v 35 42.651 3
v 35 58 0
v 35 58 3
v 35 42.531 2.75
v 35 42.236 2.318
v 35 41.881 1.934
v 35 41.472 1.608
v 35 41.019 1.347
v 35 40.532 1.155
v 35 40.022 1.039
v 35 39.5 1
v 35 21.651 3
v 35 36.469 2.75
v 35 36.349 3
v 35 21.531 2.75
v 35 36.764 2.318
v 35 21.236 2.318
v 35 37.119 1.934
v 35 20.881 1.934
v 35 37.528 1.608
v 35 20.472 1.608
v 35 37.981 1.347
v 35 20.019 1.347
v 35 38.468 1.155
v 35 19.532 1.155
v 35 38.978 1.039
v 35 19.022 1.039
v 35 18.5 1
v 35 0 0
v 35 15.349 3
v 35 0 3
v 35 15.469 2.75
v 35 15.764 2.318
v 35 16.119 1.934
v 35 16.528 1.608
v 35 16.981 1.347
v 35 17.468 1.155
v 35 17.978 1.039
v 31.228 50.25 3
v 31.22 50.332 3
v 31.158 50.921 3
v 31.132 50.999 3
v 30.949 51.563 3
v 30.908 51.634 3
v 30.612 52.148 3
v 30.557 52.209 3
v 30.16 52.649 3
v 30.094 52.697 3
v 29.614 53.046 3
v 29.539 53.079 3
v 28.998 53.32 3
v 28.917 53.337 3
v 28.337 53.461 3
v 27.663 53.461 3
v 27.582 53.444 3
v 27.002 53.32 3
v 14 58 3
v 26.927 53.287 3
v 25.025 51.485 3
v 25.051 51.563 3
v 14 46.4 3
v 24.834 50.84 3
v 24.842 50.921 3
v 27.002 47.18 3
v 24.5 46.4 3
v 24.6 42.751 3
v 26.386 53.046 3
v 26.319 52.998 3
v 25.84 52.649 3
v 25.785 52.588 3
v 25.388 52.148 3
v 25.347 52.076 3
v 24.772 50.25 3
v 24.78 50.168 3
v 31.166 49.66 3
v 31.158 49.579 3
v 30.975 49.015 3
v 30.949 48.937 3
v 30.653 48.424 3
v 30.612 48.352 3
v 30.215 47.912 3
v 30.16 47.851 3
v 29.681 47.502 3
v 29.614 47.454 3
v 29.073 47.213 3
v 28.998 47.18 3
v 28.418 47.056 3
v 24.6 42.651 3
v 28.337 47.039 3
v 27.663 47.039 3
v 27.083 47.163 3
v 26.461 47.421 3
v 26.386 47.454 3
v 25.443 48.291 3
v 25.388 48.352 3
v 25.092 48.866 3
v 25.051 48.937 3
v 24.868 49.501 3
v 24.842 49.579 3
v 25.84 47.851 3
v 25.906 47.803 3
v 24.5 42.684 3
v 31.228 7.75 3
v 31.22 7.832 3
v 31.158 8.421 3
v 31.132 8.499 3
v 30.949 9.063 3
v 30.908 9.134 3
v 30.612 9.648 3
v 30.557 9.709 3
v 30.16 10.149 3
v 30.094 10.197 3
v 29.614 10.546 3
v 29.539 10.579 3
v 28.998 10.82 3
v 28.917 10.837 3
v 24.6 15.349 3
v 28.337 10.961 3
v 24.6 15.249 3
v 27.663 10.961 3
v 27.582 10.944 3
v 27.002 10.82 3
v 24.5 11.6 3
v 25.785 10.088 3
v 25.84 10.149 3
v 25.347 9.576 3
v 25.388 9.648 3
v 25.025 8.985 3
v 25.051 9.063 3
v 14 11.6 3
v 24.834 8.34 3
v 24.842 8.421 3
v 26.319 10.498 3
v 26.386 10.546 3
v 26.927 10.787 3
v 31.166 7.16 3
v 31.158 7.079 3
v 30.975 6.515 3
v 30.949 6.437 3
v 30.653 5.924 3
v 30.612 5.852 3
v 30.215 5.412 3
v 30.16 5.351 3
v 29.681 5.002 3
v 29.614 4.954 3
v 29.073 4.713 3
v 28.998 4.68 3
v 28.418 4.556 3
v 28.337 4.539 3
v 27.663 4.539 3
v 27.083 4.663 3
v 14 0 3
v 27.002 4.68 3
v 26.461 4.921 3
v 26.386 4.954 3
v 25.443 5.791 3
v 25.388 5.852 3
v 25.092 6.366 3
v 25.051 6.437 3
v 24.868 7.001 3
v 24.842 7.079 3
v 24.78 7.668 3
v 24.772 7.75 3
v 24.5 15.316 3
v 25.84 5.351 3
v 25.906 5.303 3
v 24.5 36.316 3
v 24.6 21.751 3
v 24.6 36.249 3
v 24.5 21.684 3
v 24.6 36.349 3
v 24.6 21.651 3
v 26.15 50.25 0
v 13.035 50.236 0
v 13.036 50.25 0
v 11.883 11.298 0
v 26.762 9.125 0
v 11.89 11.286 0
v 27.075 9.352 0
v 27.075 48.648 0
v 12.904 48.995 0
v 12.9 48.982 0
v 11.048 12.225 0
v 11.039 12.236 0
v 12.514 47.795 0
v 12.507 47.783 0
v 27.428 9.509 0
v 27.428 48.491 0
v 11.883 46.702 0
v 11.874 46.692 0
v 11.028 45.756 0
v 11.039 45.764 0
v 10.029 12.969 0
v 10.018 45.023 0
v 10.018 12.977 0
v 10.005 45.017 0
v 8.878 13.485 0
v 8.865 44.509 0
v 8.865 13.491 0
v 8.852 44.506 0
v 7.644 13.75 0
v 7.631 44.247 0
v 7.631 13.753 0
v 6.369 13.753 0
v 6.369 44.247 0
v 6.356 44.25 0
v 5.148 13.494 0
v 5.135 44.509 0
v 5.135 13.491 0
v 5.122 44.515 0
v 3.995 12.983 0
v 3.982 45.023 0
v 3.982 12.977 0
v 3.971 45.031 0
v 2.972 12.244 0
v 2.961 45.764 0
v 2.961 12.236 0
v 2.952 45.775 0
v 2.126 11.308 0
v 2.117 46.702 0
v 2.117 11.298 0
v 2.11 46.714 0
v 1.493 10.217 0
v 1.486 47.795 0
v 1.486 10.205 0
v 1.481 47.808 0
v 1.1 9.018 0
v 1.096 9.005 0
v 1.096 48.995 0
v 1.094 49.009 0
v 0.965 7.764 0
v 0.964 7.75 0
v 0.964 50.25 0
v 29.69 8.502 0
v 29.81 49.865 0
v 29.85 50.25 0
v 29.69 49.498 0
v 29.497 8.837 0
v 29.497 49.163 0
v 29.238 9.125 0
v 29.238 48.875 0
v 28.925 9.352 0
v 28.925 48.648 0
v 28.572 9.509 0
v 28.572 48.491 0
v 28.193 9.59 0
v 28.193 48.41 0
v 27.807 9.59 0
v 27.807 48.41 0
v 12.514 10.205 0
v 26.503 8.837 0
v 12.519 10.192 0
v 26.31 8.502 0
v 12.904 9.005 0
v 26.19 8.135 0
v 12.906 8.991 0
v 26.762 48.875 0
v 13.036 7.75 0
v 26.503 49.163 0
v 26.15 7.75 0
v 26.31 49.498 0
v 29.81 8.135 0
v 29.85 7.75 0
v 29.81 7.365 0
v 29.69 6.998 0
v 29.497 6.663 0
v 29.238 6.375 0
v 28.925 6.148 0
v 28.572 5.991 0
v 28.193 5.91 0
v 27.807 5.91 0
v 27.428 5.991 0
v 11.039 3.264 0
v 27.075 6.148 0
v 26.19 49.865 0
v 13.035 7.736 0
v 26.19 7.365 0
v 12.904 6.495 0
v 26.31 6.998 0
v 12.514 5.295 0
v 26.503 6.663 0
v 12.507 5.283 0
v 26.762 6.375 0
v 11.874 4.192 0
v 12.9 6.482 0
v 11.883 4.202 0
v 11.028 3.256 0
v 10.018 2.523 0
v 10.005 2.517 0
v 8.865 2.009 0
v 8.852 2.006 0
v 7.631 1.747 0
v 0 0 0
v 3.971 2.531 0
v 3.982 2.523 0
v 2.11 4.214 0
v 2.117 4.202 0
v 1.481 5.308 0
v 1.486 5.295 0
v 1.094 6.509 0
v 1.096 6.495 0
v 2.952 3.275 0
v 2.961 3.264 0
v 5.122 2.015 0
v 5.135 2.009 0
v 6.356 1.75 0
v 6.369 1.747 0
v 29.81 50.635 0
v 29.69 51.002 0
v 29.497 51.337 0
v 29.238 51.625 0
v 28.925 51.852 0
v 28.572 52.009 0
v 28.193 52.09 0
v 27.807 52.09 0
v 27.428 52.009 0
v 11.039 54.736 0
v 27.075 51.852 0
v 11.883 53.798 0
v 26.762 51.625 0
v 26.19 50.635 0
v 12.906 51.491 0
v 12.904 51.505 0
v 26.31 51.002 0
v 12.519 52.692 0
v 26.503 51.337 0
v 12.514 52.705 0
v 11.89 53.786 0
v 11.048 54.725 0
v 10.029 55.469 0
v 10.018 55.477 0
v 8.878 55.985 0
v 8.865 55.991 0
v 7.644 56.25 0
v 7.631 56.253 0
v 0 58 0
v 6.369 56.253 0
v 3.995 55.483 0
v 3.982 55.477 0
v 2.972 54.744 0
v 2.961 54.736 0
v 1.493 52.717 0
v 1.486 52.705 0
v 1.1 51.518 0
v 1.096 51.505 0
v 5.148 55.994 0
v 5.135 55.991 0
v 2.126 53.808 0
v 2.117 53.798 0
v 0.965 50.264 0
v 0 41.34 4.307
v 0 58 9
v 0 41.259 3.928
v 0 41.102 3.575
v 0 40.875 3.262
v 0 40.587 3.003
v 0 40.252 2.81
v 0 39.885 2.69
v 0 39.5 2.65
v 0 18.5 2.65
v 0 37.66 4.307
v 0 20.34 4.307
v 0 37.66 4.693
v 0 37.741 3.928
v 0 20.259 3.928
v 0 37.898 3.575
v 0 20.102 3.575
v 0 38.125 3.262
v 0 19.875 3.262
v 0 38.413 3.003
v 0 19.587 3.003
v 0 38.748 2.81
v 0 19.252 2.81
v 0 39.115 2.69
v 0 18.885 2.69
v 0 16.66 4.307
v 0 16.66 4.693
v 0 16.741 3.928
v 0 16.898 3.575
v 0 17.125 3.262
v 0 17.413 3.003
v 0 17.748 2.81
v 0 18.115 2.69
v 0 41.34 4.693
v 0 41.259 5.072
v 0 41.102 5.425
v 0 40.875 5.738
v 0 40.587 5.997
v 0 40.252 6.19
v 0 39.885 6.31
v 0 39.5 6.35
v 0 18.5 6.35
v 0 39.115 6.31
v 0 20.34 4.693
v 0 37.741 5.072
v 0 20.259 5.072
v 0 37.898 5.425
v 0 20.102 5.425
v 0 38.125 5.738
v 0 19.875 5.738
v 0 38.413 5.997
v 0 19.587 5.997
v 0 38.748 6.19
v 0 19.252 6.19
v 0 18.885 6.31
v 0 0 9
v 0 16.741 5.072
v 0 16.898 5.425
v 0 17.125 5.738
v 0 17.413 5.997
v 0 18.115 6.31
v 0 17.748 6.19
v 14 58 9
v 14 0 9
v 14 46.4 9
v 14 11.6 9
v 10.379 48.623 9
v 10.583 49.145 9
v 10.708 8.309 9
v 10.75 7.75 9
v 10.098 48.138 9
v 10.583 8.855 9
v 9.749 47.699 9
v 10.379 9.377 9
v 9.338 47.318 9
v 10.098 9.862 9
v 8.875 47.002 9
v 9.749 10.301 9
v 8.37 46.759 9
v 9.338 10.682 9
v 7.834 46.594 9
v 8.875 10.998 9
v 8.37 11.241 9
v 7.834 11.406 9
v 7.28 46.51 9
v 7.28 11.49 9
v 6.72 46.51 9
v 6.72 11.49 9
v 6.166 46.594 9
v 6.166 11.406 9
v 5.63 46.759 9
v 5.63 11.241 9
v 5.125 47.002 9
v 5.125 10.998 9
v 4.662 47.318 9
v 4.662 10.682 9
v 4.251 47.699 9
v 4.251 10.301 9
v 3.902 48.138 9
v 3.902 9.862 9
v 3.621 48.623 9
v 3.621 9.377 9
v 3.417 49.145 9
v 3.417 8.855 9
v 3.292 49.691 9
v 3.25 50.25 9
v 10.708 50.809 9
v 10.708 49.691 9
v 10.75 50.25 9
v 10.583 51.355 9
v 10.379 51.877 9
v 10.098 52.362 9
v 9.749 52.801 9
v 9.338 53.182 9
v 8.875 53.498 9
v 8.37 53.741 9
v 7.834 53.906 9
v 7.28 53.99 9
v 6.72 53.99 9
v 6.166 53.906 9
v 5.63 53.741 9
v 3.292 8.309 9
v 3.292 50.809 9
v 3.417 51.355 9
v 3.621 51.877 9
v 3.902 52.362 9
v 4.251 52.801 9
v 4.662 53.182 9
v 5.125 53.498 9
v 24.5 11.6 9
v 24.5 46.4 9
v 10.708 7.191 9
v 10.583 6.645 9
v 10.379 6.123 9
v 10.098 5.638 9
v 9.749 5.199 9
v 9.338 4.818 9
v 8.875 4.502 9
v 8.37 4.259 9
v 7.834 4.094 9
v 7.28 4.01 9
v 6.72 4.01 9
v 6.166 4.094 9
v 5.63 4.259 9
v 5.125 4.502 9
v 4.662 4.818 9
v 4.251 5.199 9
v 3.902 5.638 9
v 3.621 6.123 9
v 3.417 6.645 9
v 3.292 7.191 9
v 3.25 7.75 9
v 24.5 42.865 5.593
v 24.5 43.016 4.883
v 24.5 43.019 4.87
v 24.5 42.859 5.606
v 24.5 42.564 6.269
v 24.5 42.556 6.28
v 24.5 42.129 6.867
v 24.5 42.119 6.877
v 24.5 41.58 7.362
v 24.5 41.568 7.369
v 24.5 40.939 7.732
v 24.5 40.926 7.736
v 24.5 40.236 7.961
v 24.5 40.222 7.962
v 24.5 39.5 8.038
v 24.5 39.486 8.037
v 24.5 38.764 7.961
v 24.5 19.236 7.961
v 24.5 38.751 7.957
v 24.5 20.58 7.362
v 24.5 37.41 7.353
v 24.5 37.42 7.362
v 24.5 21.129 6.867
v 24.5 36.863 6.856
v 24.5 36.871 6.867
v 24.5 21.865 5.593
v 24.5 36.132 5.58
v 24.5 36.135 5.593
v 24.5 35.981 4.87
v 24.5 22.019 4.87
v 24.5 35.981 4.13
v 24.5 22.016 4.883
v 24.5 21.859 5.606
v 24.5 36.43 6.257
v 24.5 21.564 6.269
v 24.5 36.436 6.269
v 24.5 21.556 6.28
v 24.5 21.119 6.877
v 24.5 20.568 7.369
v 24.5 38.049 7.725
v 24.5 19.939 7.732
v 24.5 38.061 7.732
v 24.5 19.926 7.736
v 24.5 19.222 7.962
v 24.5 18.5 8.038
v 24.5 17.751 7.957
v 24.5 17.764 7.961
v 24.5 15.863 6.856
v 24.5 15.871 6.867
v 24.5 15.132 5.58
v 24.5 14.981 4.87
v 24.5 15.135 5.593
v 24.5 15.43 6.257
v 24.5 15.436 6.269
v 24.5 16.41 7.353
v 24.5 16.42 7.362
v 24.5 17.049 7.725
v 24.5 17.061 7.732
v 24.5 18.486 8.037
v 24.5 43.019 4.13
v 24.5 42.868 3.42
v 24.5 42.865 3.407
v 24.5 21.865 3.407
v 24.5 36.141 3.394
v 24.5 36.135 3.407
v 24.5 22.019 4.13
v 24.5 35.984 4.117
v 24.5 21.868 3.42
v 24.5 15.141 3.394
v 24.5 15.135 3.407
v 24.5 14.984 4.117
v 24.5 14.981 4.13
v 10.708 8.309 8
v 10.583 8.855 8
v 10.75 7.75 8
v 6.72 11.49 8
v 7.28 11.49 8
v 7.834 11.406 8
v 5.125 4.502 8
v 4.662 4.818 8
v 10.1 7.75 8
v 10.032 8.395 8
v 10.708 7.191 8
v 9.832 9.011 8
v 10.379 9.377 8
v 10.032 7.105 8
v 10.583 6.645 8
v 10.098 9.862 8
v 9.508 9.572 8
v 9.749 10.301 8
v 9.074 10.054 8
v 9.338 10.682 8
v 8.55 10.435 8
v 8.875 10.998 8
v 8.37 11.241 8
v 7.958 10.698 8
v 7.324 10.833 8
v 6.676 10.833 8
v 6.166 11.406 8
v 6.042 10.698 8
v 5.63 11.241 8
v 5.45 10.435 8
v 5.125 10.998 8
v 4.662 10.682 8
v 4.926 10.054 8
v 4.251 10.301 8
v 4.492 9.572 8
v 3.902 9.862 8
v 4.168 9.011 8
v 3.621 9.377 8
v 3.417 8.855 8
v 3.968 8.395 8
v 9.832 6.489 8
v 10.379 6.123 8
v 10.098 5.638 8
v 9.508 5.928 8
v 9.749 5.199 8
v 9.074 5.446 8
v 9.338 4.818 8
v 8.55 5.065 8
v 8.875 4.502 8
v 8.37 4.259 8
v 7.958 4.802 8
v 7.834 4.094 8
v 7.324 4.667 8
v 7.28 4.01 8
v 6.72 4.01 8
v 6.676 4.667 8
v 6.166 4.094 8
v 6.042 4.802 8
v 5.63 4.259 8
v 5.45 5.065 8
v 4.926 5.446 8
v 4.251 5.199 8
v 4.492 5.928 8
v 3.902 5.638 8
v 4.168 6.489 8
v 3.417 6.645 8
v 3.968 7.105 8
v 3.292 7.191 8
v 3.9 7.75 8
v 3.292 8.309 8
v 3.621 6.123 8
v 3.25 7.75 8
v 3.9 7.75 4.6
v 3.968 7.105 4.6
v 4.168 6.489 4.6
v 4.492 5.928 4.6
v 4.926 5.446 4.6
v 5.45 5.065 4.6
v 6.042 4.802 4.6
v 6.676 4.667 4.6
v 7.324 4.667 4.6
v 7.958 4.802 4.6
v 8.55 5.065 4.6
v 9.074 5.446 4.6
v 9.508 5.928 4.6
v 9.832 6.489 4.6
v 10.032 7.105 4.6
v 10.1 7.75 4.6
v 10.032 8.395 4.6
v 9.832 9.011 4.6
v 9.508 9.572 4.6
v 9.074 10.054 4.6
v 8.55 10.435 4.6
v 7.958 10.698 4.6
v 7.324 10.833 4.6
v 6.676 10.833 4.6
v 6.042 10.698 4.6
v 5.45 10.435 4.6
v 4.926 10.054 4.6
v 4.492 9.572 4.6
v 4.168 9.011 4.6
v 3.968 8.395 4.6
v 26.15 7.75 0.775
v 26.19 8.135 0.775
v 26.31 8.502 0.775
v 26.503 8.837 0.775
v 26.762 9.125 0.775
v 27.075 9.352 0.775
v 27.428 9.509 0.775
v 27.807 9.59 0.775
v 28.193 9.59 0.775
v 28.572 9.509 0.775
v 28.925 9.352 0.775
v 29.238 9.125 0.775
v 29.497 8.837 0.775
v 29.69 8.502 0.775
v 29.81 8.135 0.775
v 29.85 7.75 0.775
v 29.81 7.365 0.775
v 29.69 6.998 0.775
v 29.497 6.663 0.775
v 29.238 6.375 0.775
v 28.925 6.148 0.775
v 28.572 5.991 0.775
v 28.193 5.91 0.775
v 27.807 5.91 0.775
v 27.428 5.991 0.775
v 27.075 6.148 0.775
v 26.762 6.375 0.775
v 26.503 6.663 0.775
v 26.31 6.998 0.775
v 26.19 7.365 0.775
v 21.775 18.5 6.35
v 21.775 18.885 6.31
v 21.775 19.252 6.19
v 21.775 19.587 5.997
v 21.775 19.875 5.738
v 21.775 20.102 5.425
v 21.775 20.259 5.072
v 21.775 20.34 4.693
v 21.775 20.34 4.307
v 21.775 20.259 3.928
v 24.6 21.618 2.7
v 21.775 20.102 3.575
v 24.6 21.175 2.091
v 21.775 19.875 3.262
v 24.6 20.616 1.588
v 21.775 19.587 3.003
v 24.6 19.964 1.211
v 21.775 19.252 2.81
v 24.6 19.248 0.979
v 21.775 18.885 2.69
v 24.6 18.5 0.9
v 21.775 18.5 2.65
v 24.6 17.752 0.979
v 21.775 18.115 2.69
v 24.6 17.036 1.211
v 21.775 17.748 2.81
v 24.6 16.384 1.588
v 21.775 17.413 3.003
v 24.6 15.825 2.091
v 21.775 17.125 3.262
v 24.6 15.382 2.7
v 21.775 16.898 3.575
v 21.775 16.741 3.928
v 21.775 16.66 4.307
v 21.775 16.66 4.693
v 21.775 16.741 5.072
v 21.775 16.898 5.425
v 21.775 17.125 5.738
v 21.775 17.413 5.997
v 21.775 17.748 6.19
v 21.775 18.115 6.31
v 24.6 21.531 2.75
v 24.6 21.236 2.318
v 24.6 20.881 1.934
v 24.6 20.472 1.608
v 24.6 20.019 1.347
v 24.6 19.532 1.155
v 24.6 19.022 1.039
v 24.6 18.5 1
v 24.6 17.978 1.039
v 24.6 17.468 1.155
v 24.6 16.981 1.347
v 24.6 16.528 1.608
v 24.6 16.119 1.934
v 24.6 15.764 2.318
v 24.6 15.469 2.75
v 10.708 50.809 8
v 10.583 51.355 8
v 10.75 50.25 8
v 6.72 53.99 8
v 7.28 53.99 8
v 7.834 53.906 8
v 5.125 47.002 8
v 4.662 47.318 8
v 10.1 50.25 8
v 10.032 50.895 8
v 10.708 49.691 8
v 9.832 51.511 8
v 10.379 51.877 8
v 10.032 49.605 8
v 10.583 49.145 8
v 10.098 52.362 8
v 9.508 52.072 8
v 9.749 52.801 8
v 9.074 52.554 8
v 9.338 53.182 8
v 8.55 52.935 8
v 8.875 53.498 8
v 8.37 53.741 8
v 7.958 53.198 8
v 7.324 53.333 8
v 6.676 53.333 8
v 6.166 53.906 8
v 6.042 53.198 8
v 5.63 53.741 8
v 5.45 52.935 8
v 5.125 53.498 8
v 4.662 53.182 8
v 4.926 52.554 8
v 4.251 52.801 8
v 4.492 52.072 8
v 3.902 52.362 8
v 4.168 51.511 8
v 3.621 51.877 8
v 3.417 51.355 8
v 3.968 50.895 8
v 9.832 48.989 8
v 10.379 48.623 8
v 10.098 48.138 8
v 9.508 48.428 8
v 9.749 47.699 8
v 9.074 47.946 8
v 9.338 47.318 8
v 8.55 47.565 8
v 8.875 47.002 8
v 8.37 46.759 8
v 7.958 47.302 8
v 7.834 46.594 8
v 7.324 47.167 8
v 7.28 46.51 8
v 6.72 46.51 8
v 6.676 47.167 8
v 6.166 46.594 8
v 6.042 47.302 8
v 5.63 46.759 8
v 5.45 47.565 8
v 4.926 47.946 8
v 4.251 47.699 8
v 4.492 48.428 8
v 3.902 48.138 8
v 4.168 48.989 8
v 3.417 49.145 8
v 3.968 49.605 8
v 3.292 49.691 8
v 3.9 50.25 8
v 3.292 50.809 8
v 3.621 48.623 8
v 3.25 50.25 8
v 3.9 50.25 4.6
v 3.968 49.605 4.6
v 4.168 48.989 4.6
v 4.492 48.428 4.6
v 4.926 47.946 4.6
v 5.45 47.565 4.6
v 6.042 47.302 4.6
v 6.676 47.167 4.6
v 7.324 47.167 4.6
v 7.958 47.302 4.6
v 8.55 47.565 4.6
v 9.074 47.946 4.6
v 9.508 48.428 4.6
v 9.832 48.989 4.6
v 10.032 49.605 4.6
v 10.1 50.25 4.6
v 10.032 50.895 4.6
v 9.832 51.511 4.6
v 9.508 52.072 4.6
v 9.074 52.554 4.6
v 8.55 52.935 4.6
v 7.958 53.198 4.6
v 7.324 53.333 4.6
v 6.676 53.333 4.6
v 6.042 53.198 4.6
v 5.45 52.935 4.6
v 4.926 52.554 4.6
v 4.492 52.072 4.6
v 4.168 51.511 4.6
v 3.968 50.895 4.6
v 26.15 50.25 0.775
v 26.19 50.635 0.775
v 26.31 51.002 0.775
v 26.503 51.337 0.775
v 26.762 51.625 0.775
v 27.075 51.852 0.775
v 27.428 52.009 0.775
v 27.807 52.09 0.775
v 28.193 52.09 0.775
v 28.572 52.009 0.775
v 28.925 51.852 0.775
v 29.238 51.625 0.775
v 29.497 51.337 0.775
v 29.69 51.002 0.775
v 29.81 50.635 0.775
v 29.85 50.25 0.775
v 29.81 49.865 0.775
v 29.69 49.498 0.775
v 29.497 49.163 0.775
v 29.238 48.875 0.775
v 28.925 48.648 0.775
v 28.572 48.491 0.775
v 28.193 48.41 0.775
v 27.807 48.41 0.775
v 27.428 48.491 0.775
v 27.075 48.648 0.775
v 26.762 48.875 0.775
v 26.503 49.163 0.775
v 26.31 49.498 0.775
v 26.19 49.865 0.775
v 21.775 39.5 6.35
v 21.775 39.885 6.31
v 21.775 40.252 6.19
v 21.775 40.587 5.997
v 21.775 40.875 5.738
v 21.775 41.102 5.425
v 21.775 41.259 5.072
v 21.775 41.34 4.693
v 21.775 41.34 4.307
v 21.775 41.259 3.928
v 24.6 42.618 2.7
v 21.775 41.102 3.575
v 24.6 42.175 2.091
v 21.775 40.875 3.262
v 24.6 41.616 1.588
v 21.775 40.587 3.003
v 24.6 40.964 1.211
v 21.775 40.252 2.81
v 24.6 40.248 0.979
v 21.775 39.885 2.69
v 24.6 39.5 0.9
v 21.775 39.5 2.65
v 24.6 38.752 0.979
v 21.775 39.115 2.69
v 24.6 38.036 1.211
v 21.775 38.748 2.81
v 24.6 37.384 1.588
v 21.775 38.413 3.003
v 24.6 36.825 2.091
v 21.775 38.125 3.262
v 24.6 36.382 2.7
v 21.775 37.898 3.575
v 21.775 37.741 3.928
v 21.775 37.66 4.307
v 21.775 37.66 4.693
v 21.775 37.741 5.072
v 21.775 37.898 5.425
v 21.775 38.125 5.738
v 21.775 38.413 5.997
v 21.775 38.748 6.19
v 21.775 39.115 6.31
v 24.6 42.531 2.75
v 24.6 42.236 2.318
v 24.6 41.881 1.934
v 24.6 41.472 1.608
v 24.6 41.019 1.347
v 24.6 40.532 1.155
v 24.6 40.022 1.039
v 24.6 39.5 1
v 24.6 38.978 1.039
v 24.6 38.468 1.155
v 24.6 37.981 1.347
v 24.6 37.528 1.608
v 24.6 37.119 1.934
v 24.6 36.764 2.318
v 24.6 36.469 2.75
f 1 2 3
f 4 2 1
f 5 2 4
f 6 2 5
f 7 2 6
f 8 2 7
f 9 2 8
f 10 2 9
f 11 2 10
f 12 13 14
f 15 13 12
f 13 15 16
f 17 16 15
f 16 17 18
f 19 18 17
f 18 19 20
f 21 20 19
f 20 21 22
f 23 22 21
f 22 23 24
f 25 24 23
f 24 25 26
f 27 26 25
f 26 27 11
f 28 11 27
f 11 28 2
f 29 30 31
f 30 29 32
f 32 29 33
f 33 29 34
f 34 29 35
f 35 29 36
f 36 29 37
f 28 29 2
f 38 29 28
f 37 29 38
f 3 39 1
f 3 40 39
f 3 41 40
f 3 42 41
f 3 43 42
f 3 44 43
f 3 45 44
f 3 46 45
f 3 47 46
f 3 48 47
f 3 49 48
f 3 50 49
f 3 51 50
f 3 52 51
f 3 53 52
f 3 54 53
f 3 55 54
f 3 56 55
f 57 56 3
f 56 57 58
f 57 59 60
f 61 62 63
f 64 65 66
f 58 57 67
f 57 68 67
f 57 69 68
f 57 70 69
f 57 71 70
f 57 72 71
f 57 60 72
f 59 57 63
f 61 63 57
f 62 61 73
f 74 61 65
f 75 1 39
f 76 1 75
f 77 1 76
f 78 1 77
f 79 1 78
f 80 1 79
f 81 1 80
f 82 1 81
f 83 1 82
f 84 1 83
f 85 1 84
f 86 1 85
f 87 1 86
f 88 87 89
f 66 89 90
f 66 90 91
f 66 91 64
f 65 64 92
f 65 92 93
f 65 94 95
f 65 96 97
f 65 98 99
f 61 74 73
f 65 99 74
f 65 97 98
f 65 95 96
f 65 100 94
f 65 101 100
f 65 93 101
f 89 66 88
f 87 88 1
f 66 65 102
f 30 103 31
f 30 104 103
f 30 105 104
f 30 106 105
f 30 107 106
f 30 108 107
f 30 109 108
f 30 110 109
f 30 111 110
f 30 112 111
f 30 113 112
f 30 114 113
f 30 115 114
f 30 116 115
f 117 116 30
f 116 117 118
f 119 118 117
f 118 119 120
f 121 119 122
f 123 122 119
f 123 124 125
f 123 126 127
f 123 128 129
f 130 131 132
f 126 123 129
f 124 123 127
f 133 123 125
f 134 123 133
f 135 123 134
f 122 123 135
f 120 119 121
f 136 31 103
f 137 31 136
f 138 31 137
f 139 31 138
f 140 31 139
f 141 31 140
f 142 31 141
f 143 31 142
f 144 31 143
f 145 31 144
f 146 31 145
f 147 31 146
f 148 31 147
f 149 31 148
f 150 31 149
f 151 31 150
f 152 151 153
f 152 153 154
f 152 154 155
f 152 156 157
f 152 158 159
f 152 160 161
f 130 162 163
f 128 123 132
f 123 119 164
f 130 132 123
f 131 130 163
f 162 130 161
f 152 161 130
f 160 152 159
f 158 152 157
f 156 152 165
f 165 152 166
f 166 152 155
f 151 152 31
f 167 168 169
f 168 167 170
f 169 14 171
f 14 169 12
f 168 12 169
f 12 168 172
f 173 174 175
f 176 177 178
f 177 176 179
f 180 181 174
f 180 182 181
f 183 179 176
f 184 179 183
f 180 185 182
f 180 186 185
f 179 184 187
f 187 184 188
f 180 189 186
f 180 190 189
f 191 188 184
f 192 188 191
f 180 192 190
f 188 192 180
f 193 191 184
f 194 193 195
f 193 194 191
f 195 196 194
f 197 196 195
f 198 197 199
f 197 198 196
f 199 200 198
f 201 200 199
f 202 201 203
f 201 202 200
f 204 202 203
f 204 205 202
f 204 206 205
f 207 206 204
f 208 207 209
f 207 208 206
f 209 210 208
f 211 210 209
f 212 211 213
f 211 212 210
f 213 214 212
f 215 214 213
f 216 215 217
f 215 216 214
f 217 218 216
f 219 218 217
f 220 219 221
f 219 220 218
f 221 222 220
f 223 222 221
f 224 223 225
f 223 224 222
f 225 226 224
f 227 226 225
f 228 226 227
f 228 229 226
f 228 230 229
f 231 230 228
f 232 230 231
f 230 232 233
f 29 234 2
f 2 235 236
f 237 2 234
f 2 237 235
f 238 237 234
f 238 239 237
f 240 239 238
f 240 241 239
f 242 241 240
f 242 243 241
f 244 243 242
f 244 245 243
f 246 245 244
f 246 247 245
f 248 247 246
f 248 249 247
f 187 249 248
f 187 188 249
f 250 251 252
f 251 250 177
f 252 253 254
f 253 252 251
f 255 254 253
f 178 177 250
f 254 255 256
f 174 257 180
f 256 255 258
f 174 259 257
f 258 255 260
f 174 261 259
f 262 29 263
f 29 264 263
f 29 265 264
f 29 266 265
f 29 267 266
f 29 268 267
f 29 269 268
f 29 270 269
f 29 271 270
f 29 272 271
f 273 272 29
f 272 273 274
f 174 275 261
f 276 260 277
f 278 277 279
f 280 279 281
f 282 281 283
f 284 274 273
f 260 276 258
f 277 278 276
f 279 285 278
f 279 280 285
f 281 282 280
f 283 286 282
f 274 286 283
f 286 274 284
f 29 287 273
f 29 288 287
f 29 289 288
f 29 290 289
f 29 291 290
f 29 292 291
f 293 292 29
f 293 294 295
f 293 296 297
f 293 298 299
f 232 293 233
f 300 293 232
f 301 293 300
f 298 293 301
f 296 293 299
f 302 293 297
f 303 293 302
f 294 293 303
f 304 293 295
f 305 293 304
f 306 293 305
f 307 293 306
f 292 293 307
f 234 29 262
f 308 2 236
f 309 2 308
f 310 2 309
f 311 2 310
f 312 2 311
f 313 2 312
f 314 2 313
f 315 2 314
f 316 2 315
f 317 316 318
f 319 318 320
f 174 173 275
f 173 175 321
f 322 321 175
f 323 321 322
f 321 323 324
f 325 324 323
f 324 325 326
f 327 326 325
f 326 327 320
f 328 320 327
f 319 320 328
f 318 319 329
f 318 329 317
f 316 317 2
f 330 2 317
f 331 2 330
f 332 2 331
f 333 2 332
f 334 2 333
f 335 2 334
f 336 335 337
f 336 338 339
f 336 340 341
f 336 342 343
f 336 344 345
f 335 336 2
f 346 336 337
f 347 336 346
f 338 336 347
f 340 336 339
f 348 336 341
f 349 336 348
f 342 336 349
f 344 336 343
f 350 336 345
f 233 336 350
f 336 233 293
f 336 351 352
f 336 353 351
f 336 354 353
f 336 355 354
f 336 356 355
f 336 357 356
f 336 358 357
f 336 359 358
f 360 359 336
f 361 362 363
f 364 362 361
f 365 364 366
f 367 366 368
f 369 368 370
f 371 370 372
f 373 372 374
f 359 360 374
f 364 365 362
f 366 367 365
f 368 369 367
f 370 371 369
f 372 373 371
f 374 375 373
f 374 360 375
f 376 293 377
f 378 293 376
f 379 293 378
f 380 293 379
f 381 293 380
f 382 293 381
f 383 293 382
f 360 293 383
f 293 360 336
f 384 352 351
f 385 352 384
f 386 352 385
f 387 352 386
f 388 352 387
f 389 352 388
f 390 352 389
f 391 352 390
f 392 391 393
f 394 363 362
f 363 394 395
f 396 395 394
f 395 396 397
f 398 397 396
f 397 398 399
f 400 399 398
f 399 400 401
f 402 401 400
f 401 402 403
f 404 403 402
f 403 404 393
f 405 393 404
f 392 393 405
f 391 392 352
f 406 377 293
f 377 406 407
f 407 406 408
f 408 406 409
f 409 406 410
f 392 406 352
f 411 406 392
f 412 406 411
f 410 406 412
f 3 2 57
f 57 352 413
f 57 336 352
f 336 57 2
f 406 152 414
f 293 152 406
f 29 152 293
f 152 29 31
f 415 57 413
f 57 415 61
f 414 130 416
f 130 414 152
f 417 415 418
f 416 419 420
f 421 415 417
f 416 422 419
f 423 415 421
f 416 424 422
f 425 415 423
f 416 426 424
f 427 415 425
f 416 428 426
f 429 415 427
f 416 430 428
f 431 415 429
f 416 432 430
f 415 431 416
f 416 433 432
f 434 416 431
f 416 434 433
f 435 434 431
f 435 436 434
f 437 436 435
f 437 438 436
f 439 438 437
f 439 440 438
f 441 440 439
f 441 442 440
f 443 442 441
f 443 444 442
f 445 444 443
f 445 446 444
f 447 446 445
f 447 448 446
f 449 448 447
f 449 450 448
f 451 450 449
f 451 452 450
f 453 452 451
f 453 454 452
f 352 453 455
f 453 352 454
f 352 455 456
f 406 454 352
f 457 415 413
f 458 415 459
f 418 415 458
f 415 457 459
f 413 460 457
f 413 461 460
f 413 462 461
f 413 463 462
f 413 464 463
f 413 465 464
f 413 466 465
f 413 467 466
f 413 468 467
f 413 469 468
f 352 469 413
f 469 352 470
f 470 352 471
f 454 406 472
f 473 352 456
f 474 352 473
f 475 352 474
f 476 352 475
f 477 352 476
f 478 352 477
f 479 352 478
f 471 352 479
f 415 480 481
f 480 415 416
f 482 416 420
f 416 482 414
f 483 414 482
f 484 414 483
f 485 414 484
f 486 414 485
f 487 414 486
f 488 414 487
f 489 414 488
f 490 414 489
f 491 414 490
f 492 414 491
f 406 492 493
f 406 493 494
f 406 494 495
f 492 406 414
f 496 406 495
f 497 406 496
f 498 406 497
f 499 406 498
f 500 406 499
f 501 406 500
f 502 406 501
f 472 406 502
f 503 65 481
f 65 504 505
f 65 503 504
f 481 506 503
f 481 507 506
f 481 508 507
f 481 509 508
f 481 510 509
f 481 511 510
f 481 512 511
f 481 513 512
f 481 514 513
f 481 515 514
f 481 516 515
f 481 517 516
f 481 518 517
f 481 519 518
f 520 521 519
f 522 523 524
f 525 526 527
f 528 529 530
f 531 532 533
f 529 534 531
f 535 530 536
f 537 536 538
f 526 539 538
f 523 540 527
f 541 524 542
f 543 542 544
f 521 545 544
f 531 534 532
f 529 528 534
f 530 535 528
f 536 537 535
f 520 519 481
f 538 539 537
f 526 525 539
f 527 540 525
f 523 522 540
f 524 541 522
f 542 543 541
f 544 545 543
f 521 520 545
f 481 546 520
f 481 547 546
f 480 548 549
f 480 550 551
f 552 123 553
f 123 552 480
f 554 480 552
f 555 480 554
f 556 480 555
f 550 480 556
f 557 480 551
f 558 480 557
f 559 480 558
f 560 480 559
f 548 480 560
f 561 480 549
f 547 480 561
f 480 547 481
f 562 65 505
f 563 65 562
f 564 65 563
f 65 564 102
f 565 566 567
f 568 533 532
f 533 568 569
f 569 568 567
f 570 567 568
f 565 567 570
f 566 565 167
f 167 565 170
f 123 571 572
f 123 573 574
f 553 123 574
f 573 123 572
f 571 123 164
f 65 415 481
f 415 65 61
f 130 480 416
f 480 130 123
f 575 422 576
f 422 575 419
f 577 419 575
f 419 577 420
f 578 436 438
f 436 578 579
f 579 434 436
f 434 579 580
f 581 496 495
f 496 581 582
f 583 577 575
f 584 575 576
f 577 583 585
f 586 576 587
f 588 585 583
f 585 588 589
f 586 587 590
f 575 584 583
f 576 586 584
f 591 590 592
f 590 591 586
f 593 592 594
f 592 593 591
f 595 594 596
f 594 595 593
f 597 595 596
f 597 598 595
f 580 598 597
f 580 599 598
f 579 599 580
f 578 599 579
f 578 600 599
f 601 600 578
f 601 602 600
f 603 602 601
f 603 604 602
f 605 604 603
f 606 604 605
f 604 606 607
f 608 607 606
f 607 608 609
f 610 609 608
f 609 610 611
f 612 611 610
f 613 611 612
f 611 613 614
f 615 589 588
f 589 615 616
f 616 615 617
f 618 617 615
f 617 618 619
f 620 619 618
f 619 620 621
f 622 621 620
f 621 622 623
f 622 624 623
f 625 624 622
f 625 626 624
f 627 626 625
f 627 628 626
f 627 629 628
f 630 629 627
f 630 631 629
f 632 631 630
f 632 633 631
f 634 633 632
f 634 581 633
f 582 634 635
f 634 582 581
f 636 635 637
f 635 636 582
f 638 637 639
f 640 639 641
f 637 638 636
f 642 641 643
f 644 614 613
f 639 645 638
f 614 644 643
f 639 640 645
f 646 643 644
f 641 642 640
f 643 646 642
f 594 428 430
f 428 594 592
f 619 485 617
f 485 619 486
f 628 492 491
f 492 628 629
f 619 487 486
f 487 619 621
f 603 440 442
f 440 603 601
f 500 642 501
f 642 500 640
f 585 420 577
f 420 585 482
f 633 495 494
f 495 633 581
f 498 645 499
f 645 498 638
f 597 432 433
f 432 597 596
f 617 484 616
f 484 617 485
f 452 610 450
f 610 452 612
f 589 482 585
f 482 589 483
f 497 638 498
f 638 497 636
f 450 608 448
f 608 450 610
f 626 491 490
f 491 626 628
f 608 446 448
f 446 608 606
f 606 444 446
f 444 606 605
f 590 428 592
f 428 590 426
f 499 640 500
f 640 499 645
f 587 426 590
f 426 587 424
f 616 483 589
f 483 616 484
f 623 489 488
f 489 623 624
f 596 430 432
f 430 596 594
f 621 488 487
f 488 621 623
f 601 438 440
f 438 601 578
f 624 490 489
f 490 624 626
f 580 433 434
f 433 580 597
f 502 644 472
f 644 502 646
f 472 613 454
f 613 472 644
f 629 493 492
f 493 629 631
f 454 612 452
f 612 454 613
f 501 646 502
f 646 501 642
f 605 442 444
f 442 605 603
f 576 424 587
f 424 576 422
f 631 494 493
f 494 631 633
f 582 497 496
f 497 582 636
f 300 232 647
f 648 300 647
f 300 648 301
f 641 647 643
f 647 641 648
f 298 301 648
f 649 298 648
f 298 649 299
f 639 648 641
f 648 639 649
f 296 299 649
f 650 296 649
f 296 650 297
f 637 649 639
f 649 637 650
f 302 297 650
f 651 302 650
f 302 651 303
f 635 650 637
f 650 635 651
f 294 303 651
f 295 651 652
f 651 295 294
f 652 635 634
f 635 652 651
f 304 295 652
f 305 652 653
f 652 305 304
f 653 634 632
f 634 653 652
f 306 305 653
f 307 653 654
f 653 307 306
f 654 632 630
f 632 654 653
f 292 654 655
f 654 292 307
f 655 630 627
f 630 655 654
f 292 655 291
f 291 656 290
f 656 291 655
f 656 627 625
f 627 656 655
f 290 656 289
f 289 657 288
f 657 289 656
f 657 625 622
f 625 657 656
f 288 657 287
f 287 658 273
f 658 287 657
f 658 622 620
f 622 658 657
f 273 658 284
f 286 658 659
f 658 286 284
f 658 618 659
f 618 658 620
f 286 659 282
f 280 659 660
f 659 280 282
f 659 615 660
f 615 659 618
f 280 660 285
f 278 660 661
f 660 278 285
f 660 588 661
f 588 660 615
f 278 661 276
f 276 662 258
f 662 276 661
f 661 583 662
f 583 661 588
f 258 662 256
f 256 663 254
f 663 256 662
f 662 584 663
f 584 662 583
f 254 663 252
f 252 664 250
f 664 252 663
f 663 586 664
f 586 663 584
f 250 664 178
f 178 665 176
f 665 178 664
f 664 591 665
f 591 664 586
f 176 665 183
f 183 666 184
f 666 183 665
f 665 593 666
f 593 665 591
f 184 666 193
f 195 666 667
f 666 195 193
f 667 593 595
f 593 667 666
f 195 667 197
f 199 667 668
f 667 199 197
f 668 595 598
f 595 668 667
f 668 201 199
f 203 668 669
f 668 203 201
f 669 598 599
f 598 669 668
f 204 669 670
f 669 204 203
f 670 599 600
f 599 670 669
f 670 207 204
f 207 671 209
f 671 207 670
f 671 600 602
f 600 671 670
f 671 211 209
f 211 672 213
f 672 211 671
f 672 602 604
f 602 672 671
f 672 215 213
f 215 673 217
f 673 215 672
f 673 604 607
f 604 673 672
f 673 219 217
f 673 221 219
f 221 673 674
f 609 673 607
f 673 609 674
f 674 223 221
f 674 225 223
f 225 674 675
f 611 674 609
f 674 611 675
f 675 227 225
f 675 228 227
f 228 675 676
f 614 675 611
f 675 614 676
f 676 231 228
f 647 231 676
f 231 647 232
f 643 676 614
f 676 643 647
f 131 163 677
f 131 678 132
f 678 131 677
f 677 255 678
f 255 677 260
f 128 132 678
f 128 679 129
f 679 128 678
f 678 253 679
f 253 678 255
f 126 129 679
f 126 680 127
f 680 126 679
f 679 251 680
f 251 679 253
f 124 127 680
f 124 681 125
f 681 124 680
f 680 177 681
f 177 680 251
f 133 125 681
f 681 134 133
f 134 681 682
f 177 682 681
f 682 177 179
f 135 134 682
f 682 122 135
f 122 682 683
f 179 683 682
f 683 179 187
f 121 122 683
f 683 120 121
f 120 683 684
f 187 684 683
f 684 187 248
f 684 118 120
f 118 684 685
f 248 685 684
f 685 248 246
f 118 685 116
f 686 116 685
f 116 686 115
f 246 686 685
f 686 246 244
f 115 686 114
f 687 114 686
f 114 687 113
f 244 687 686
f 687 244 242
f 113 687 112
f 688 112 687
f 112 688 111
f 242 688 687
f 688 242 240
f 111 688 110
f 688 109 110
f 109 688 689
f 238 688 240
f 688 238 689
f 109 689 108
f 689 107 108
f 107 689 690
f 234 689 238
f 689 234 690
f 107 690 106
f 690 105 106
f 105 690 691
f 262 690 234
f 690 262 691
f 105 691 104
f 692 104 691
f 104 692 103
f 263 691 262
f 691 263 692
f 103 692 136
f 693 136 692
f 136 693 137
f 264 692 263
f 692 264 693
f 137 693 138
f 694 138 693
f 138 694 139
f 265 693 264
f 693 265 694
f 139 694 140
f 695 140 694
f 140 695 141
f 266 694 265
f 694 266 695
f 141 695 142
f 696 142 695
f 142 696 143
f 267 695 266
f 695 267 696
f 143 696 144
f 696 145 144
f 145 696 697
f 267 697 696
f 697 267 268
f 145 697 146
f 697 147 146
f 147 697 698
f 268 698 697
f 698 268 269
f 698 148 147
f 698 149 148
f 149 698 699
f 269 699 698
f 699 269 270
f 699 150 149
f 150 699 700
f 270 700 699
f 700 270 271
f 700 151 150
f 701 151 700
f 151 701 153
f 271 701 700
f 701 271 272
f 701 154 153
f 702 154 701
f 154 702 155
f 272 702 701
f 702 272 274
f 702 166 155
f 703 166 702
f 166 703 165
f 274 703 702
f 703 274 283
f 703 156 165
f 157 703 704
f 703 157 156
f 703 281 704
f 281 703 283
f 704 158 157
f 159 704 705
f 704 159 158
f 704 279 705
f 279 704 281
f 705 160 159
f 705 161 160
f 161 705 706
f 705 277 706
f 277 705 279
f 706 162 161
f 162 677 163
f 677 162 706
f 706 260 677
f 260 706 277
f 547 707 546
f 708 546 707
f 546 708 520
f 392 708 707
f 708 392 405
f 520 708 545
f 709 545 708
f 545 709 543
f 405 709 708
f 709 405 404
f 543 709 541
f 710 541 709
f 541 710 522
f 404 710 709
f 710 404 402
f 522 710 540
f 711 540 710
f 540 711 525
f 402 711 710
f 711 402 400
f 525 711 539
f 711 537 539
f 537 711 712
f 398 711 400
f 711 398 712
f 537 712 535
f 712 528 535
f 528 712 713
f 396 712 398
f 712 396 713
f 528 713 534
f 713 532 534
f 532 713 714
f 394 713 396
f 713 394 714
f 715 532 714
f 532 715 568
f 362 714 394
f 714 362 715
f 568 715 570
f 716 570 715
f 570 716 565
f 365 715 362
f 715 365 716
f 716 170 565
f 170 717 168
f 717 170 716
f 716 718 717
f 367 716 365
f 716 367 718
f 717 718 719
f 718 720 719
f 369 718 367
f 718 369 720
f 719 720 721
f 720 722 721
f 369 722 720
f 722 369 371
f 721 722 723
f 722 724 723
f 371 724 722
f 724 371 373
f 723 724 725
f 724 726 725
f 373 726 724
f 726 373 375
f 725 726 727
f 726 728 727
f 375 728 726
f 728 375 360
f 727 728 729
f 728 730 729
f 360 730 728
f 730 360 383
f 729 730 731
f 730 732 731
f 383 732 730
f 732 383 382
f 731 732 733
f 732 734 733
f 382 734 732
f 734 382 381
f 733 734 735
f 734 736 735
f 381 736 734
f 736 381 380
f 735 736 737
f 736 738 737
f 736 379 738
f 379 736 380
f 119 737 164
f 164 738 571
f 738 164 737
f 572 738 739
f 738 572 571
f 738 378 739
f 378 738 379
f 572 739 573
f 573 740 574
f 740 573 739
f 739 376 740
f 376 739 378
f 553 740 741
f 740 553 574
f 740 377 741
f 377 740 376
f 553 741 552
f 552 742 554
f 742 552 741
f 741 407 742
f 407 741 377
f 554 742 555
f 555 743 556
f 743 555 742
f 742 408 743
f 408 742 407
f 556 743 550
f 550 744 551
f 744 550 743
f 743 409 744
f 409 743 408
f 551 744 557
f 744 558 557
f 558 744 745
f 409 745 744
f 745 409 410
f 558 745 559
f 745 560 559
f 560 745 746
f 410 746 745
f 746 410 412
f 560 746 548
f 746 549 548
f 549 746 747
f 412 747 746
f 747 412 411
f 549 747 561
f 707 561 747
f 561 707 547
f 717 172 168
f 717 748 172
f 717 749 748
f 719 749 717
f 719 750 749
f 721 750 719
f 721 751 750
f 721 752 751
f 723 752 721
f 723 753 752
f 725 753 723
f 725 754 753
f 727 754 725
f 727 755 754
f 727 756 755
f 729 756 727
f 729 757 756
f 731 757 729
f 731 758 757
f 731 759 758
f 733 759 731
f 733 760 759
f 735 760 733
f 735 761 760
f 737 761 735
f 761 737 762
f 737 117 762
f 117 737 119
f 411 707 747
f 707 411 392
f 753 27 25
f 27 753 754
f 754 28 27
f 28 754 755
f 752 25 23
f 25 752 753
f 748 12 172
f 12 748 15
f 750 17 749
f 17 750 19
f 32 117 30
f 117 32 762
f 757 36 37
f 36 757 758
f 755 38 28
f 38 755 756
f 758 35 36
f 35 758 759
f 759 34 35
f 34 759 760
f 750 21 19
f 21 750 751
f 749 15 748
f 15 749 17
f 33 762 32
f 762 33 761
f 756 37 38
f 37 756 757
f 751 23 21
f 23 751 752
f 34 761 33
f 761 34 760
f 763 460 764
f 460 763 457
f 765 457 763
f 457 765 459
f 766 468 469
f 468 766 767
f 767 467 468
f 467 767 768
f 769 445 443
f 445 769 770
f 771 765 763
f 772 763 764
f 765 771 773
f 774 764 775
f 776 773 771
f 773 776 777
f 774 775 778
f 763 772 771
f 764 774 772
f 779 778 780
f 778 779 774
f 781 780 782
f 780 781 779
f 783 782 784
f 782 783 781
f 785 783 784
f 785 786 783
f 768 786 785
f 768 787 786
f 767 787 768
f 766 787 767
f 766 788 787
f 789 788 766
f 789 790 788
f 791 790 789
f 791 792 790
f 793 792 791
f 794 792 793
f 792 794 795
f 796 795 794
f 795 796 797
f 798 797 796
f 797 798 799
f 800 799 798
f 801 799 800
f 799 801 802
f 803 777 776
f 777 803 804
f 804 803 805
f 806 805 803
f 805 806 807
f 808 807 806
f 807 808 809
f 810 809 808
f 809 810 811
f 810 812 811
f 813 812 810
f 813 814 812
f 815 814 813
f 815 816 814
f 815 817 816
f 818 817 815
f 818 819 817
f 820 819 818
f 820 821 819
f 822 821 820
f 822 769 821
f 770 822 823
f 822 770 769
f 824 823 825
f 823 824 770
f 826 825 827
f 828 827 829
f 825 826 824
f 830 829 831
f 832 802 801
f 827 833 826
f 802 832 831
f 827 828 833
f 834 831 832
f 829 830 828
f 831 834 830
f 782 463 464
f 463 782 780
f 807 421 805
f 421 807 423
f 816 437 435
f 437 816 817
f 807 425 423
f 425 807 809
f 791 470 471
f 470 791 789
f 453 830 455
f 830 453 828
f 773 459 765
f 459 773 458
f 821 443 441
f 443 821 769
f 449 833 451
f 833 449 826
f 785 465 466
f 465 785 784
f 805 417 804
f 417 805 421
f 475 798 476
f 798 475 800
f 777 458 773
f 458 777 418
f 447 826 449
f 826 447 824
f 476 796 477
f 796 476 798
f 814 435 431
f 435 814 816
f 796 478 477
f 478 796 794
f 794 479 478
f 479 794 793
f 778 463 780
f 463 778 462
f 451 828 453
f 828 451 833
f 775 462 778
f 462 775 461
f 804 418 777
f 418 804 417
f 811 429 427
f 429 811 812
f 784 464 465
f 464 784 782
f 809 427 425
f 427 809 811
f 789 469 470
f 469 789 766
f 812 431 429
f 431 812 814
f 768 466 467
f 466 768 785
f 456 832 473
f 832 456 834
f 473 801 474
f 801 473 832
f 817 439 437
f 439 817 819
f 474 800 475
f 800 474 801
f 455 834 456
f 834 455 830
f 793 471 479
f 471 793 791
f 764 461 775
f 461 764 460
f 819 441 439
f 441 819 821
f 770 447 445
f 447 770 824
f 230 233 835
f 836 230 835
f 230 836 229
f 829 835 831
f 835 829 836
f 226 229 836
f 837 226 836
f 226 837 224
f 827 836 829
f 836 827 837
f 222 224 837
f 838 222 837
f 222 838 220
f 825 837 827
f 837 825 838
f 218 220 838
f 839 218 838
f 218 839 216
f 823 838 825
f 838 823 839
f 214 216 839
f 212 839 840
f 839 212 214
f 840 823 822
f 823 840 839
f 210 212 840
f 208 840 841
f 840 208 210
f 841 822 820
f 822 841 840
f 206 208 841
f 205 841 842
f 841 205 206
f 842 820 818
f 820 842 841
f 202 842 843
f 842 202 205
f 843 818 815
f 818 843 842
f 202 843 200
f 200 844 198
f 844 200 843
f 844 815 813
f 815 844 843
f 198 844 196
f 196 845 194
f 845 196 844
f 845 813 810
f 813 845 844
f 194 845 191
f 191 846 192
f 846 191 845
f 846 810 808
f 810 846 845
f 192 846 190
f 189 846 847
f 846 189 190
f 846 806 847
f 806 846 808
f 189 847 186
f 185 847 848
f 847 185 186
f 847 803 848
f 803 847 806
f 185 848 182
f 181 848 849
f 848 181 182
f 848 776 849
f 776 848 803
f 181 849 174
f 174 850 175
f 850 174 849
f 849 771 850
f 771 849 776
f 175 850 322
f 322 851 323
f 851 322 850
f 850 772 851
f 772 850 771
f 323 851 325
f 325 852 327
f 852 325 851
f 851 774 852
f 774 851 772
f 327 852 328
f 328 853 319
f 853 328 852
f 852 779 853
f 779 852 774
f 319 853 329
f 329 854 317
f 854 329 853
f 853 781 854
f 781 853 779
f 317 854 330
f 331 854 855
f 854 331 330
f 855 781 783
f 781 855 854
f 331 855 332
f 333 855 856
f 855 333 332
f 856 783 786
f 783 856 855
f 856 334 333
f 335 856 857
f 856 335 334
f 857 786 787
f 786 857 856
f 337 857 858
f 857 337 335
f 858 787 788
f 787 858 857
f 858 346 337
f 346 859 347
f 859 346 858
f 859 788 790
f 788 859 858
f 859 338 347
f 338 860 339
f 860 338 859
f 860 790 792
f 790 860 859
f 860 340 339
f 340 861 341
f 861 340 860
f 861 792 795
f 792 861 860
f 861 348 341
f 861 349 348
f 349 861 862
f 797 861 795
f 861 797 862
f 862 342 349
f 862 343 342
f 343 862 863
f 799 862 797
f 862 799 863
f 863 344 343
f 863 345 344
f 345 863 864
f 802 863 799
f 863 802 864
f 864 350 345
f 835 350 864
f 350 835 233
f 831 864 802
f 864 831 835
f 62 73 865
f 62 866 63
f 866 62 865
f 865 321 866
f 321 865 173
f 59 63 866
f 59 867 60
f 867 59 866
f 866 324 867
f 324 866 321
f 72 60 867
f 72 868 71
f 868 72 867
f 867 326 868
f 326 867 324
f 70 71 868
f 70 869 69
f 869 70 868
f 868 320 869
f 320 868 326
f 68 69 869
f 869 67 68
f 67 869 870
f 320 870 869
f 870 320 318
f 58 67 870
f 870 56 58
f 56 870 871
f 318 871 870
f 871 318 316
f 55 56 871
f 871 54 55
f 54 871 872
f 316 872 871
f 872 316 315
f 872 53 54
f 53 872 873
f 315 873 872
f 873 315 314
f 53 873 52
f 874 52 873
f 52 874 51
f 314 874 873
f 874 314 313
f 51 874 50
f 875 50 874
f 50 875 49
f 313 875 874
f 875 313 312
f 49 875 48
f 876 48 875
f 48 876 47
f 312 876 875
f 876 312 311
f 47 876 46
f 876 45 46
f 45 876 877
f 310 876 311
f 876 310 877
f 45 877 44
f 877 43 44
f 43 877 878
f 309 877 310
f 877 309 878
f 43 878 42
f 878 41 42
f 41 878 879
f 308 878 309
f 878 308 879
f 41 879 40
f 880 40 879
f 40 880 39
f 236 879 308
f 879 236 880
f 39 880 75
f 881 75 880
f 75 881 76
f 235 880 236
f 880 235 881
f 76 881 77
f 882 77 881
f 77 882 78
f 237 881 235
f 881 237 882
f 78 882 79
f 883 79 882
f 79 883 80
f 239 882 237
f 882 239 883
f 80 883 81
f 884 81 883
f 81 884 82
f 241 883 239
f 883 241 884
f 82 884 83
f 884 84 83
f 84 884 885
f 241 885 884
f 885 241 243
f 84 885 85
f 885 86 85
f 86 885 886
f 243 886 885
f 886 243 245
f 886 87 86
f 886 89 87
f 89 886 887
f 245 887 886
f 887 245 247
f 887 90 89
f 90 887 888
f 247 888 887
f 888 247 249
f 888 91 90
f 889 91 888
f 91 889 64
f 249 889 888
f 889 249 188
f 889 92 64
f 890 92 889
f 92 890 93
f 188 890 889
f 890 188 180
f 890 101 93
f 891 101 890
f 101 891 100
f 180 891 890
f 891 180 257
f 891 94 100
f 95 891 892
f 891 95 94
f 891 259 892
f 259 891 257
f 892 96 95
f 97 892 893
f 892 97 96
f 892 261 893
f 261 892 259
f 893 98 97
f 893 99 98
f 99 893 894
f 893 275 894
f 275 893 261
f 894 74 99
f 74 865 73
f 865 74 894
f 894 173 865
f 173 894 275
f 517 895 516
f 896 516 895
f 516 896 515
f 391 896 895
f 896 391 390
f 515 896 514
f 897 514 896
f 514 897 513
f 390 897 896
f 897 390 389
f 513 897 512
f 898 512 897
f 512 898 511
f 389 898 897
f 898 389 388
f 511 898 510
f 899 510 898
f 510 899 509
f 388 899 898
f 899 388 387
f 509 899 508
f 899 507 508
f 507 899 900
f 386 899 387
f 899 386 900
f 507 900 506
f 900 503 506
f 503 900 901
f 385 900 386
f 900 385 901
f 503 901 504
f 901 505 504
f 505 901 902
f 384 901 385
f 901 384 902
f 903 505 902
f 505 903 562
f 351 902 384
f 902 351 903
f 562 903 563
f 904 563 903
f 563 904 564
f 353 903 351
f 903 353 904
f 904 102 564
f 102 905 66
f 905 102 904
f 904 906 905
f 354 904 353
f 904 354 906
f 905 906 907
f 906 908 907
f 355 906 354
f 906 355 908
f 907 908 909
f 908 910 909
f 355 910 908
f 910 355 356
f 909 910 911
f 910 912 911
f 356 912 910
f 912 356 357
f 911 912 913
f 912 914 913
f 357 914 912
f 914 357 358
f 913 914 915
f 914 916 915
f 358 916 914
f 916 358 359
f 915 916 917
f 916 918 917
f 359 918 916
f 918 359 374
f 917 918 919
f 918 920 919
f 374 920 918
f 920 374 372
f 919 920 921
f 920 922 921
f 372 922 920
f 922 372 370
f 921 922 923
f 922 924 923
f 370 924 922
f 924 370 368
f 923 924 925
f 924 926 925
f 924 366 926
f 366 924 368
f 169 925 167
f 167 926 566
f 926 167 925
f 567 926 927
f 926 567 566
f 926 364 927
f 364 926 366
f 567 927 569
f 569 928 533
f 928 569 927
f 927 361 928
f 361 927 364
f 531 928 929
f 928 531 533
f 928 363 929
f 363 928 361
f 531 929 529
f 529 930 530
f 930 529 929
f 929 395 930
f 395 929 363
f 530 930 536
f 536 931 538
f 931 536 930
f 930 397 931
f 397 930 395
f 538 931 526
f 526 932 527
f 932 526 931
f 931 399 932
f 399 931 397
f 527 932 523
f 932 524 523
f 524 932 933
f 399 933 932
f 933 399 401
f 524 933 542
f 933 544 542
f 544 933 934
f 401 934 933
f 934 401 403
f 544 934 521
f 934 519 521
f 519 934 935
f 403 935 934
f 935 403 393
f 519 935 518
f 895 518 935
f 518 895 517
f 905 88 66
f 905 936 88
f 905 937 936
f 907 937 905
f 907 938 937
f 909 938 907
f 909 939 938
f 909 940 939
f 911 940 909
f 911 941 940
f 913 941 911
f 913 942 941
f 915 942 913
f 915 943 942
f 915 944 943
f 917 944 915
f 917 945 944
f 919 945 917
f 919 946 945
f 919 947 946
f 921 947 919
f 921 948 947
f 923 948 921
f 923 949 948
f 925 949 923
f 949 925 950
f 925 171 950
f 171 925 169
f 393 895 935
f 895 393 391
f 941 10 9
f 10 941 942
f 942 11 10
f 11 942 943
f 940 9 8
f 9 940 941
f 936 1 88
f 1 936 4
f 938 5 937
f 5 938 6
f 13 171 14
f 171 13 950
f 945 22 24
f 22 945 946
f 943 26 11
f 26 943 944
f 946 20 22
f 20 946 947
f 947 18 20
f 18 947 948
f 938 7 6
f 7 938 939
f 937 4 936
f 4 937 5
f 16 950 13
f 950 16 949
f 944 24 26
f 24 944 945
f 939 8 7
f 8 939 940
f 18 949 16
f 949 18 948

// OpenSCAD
// file: Parts/Screw.scad
// created by IndiePandaaaaa | Lukas

function cone_diameter(diameter) = diameter * 2;

function cone_height(diameter) = diameter * 0.75;

module screw(diameter, length, cutout_sample = false, fs = 0.1, fa = 1) {
    //$fs = 0.1; [size in mm] | $fa = 1; [degrees]
    //$fn = 100; [defined faces]

    module base_model(diameter, length, cone_height, cone_diameter, offset = 0, fs = 0.1, fa = 1) {
        rotate_extrude($fs = fs) {
            polygon([
                    [0, 0],
                    [(diameter + offset) / 2, 0],
                    [(diameter + offset) / 2, (length + offset) - (cone_height + offset)],
                    [(cone_diameter + offset) / 2, length + offset],
                    [0, length + offset],
                ]);
        }
    }

    if (length < diameter) {
        echo("Screw is too short");
        length = diameter + 1;
        echo("New length is: ", length);
    }

    if (!cutout_sample) {
        translate([0, 0, - length])
            difference() {
                base_model(diameter, length, cone_height(diameter), cone_diameter(diameter));

                // top cross part
                translate([0, 0, length + 0.1 - (cone_height(diameter) - diameter / 2)])
                    difference() {
                        rotate([0, 0, 45])
                            rotate_extrude($fn = 4) {
                                polygon([
                                        [0, 0],
                                        [diameter * 1.4 / 2, 0],
                                        [cone_diameter(diameter) / 2, cone_height(diameter) - diameter / 2],
                                        [0, cone_height(diameter) - diameter / 2],
                                    ]);
                            }
                        for (i = [0 : 1 : 3]) {
                            rotate([0, 0, 90 * i])
                                translate([diameter / 3.18 / 2, diameter / 3.18 / 2, - 0.1])
                                    cube(cone_height(diameter) + 0.2);
                        }
                    }
            }
    } else {
        offset = 0.2;
        translate([0, 0, - length - offset / 2])
            base_model(diameter, length, cone_height(diameter), cone_diameter(diameter), offset);
    }
}

screw(3.5, 12);
// main file
// created by IndiePandaaaaa | Lukas

use <Parts/Screw.scad>

MODEL_TOLERANCE = 0.1;
MODEL_THICKNESS = 3;
FN = 42;

SOCKET_WIDTH = 14;
PLATE_DEPTH = 58;
PLATE_WIDTH = 21 + SOCKET_WIDTH;
PLATE_SCREW_OD = 3.5;

WOOD_BOARD_THICKNESS = 9;
WOOD_BOARD_WIDTH = 28;
WOOD_BOARD_SCREW_DIST = WOOD_BOARD_WIDTH - 3.5 * 2;

BREMOUNTA_SCREW_DIST = 50;
BREMOUNTA_SCREW_OD = 6;
BREMOUNTA_SCREW_HOLE_ID = 6.5;
BREMOUNTA_SCREW_HOLE_OD = BREMOUNTA_SCREW_HOLE_ID + 1;
BREMOUNTA_SCREW_HOLE_OD_DEPTH = 1;


difference() {
    union() {
        cube([PLATE_WIDTH, PLATE_DEPTH, MODEL_THICKNESS]);
        cube([SOCKET_WIDTH, PLATE_DEPTH, WOOD_BOARD_THICKNESS]);
        translate([0, PLATE_DEPTH / 5, 0]) cube([SOCKET_WIDTH * 1.75, PLATE_DEPTH / 5 * 3, WOOD_BOARD_THICKNESS]);
    }
    for (i = [0:1]) {
        translate([SOCKET_WIDTH / 2, (PLATE_DEPTH - BREMOUNTA_SCREW_DIST + BREMOUNTA_SCREW_HOLE_OD) / 2, 0]) {
            translate([0, (BREMOUNTA_SCREW_DIST - BREMOUNTA_SCREW_HOLE_OD) * i, 0]) {
                translate([0, 0, WOOD_BOARD_THICKNESS - BREMOUNTA_SCREW_HOLE_OD_DEPTH])
                    cylinder(d = BREMOUNTA_SCREW_HOLE_OD, h = BREMOUNTA_SCREW_HOLE_OD_DEPTH, $fn = FN);
                rotate([180, 0, 0]) screw(BREMOUNTA_SCREW_OD, 30, true);
                translate([PLATE_WIDTH - SOCKET_WIDTH, 0, PLATE_SCREW_OD]) screw(PLATE_SCREW_OD, 12, true);
            }
        }
        if (WOOD_BOARD_THICKNESS > PLATE_SCREW_OD * 2) {
            translate([SOCKET_WIDTH * 1.75, (PLATE_DEPTH - WOOD_BOARD_SCREW_DIST) / 2 + WOOD_BOARD_SCREW_DIST * i,
                    WOOD_BOARD_THICKNESS / 2]) rotate([0, 90, 0]) {
                screw(PLATE_SCREW_OD, 35, true);
                cylinder(d = PLATE_SCREW_OD * 2, h = PLATE_WIDTH, $fn = FN);
            }
        }
    }
}
